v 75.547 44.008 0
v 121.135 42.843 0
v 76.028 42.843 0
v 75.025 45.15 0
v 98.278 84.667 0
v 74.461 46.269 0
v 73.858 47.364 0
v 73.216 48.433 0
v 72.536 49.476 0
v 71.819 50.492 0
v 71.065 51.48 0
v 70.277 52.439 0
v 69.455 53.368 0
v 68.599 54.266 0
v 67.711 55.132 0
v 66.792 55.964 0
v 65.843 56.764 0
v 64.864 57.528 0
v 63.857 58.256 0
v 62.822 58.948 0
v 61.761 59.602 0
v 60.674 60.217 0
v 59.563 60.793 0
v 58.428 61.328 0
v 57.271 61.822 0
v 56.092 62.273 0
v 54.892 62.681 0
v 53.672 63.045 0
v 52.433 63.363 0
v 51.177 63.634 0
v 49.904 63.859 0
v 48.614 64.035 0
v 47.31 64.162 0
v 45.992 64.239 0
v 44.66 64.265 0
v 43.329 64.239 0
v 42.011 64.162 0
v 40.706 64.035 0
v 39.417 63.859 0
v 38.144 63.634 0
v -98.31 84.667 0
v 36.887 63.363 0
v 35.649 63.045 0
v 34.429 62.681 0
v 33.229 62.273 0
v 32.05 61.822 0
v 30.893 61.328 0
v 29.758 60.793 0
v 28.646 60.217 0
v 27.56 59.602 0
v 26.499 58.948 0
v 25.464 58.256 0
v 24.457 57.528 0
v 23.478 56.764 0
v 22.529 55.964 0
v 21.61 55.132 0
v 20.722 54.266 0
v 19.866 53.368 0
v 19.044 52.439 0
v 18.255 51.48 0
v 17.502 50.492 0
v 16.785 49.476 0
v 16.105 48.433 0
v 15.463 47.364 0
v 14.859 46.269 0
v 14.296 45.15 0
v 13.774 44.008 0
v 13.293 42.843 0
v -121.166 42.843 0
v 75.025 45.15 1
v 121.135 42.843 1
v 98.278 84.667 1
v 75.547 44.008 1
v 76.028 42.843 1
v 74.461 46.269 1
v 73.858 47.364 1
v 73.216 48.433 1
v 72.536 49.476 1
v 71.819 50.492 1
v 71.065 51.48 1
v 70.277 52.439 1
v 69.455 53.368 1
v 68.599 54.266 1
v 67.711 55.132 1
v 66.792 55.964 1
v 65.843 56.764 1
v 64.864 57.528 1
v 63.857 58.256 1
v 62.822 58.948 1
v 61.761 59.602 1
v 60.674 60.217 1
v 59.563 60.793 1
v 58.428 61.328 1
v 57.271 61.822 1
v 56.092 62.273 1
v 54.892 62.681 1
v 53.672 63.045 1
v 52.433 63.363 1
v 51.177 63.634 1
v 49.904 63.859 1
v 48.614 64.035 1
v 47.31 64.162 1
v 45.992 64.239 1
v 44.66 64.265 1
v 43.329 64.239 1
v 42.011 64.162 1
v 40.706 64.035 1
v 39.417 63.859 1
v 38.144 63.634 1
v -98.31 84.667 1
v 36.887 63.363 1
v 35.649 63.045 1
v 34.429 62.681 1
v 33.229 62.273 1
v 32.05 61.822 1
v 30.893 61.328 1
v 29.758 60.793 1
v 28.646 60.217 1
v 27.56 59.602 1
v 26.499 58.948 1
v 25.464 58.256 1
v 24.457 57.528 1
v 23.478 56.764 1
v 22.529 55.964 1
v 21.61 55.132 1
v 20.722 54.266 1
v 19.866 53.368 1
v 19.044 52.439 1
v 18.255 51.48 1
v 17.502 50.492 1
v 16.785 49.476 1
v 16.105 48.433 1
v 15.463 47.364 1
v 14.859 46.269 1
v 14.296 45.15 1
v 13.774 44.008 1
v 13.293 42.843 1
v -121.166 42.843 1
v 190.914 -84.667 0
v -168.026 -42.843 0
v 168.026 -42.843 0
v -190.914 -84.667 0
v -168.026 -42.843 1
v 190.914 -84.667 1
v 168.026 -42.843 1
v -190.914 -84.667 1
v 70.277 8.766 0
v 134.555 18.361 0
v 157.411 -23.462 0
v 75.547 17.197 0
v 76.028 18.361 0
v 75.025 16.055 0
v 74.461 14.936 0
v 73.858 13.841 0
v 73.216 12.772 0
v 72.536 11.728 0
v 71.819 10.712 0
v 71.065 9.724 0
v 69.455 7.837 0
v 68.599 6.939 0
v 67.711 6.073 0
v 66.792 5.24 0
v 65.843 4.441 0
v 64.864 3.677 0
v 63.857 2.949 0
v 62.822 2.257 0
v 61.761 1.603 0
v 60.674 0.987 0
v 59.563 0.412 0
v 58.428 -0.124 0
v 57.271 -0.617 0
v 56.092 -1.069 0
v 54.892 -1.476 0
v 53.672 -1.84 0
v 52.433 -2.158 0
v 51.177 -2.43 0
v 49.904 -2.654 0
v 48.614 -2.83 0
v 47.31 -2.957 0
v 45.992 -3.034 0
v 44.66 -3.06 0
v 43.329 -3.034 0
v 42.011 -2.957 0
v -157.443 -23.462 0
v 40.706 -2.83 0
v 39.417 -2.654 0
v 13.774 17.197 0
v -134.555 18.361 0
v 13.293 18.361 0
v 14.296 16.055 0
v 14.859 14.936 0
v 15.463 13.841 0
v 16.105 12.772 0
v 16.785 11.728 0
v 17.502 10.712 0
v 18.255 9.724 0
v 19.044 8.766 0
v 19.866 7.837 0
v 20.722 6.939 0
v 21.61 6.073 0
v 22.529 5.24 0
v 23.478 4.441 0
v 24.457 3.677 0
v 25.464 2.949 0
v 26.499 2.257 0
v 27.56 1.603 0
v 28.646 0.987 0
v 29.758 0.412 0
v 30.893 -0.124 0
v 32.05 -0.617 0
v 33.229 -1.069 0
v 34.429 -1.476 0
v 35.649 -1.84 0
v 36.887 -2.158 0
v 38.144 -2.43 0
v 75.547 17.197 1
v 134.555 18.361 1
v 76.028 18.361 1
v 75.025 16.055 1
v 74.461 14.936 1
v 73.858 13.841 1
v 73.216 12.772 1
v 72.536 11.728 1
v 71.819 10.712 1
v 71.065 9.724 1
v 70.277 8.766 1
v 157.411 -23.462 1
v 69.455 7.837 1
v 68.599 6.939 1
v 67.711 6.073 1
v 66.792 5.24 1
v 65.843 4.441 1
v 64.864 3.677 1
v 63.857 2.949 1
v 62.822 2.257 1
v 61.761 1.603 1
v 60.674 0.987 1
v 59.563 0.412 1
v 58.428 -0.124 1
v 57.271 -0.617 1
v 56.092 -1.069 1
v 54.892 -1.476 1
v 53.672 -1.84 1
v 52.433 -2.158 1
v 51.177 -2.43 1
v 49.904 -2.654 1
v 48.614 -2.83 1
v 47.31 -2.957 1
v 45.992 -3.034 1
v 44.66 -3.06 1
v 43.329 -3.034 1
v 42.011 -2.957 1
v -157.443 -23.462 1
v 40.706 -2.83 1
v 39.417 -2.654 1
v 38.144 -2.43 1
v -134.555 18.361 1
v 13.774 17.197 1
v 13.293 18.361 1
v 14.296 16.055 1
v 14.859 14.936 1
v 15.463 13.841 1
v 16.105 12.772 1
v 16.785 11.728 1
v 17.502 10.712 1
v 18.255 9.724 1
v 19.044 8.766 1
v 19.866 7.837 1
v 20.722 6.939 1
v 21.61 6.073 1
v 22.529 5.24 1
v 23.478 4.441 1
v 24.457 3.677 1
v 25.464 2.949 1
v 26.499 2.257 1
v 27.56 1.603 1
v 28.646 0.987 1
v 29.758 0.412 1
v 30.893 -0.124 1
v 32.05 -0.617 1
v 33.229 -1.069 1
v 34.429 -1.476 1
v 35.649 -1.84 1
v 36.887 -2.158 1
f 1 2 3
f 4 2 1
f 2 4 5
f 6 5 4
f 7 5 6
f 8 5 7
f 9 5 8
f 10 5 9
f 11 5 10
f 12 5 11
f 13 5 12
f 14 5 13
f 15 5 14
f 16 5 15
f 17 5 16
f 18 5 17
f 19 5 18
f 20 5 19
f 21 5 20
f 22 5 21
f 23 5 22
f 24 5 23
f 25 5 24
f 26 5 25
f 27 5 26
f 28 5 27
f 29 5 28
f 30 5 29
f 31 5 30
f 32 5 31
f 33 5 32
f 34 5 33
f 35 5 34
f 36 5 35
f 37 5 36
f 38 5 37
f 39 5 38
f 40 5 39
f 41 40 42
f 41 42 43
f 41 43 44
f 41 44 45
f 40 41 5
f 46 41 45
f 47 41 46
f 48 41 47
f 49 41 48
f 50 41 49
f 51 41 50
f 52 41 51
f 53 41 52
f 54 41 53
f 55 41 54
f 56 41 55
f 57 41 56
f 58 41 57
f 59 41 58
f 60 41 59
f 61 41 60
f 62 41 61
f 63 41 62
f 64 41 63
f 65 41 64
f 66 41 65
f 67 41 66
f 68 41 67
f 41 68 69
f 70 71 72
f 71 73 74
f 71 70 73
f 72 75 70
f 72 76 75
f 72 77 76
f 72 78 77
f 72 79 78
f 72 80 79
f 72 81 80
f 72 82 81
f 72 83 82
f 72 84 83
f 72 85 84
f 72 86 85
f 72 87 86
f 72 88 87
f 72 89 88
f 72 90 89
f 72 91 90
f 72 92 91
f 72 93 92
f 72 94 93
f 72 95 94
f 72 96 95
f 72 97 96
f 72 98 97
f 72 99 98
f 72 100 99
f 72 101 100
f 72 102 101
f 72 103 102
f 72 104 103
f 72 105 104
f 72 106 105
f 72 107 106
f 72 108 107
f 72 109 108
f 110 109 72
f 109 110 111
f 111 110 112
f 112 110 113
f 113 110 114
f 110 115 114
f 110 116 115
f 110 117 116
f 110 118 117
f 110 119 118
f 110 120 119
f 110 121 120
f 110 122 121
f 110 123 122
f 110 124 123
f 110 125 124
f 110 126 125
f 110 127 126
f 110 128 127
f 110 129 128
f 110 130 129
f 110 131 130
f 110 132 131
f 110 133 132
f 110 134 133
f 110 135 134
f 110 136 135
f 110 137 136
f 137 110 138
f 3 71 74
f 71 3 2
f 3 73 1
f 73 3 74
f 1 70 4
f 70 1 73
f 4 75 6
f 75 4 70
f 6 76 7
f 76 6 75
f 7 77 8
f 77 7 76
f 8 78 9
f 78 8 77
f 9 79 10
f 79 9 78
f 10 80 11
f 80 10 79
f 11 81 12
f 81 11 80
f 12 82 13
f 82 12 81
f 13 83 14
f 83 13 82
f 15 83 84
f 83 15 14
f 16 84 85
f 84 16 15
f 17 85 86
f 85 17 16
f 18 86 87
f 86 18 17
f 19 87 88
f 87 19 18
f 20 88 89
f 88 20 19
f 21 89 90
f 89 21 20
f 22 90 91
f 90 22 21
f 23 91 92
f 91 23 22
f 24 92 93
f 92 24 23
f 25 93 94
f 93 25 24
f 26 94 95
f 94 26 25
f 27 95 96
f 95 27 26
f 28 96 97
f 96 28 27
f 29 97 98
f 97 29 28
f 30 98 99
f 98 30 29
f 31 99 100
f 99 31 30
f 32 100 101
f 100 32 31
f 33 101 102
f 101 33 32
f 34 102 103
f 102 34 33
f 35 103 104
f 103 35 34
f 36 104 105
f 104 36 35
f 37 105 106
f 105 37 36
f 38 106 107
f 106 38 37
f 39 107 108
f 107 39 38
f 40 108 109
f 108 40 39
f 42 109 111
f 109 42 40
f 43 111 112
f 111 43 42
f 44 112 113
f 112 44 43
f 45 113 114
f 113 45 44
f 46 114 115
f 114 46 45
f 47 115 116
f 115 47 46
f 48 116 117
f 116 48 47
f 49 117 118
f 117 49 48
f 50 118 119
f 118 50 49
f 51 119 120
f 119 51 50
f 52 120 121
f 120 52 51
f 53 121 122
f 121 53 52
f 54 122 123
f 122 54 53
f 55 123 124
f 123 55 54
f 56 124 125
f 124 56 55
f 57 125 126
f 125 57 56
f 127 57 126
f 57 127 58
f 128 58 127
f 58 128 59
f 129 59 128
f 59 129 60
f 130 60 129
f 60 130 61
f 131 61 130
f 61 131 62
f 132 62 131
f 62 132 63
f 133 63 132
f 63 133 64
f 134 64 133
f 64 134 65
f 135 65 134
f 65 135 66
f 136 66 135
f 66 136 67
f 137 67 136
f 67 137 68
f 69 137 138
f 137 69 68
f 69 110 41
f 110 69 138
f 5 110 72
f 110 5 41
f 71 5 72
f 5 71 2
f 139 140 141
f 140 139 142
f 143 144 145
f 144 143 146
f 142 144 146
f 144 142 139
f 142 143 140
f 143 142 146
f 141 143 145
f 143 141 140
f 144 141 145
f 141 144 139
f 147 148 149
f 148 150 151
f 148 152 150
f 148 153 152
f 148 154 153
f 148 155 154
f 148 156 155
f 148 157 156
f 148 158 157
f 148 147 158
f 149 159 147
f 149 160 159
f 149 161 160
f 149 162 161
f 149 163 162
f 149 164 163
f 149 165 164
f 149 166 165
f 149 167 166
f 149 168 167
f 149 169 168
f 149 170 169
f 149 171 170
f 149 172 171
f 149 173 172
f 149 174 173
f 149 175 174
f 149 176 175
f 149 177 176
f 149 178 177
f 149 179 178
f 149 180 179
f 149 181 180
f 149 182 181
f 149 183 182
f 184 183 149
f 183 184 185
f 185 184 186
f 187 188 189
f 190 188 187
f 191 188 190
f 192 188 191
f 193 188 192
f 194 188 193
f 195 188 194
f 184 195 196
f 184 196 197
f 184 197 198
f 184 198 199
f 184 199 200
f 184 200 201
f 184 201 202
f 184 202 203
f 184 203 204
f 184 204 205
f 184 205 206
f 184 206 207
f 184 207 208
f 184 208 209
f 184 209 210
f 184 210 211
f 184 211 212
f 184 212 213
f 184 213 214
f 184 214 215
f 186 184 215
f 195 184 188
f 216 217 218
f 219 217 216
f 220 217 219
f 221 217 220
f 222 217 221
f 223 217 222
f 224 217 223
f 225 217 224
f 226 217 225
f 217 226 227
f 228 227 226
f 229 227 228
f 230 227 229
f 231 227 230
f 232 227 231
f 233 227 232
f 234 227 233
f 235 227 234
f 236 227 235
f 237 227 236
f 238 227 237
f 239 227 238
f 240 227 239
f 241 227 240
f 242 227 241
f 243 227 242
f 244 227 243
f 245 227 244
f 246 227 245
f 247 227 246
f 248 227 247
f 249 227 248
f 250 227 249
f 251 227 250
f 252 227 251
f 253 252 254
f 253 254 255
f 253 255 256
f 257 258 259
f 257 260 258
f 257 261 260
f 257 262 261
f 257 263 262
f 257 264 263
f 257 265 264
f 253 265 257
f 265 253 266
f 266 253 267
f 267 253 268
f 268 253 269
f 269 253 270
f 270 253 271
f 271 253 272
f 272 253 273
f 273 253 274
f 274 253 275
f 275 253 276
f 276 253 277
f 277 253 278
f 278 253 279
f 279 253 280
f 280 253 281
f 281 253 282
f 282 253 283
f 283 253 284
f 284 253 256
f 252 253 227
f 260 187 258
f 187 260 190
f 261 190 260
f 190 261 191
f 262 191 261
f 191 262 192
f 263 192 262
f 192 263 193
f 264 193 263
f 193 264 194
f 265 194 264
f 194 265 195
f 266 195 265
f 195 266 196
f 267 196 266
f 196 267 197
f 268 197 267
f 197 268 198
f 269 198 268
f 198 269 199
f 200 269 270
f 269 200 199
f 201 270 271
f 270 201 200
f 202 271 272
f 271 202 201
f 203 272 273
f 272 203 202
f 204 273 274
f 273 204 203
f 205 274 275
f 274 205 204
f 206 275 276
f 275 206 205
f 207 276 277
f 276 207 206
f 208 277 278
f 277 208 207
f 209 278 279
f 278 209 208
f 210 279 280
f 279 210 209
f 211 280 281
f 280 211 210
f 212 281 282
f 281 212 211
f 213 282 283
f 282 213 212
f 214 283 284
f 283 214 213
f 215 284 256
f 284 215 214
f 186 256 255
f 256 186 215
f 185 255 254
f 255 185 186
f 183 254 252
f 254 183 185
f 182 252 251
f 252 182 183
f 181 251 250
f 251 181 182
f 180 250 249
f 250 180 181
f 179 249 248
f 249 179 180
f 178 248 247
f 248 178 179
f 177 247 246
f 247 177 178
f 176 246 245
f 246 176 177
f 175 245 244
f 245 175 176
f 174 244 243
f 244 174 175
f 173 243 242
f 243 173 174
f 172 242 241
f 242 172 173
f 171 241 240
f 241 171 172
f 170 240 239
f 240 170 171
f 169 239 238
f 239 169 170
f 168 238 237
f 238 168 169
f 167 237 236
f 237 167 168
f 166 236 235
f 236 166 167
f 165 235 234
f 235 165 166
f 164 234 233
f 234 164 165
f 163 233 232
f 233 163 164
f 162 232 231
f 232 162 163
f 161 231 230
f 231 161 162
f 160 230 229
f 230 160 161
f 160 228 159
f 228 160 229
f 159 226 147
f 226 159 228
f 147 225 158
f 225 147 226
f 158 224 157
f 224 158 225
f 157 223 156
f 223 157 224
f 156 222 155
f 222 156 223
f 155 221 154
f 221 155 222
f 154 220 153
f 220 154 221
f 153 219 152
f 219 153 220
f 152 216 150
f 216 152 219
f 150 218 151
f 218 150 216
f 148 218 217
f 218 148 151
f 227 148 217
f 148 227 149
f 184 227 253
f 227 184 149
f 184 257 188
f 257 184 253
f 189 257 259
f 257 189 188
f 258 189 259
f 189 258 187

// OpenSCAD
// Module names are of the form poly_<inkscape-path-id>().  As a result,
// you can associate a polygon in this OpenSCAD program with the corresponding
// SVG element in the Inkscape document by looking for the XML element with
// the attribute id="inkscape-path-id".

// fudge value is used to ensure that subtracted solids are a tad taller
// in the z dimension than the polygon being subtracted from.  This helps
// keep the resulting .stl file manifold.
fudge = 0.1;

module logo_ia(h) {
	l_ia_poly_path2258(1);
	l_ia_poly_rect2221(1);
	l_ia_poly_path2256(1);
}

module l_ia_poly_path2258(h)
{
  scale([25.4/90, -25.4/90, 1]) union()
  {
    linear_extrude(height=h)
      polygon([[-348.343370,-299.999997],[-429.329816,-151.807228],[47.100903,-151.807228],[48.804186,-155.933918],[50.655575,-159.981314],[52.651679,-163.946025],[54.789107,-167.824659],[57.064467,-171.613824],[59.474369,-175.310131],[62.015420,-178.910187],[64.684229,-182.410601],[67.477406,-185.807982],[70.391557,-189.098939],[73.423293,-192.280080],[76.569221,-195.348015],[79.825951,-198.299352],[83.190090,-201.130700],[86.658248,-203.838668],[90.227032,-206.419864],[93.893053,-208.870898],[97.652917,-211.188377],[101.503235,-213.368912],[105.440613,-215.409109],[109.461662,-217.305580],[113.562990,-219.054931],[117.741204,-220.653773],[121.992915,-222.098713],[126.314730,-223.386361],[130.703258,-224.513324],[135.155107,-225.476213],[139.666887,-226.271636],[144.235206,-226.896202],[148.856672,-227.346518],[153.527894,-227.619195],[158.245481,-227.710841],[162.963070,-227.619199],[167.634295,-227.346524],[172.255764,-226.896210],[176.824084,-226.271647],[181.335866,-225.476225],[185.787717,-224.513338],[190.176246,-223.386375],[194.498061,-222.098728],[198.749772,-220.653788],[202.927987,-219.054947],[207.029315,-217.305596],[211.050363,-215.409125],[214.987742,-213.368927],[218.838059,-211.188392],[222.597923,-208.870912],[226.263942,-206.419878],[229.832726,-203.838681],[233.300883,-201.130712],[236.665021,-198.299363],[239.921749,-195.348025],[243.067677,-192.280089],[246.099411,-189.098946],[249.013562,-185.807988],[251.806737,-182.410606],[254.475545,-178.910191],[257.016595,-175.310134],[259.426496,-171.613827],[261.701856,-167.824660],[263.839283,-163.946026],[265.835387,-159.981315],[267.686776,-155.933918],[269.390058,-151.807228],[429.216864,-151.807228],[348.230419,-299.999997],[-348.343370,-299.999997]]);
  }
}

module l_ia_poly_rect2221(h)
{
  scale([25.4/90, -25.4/90, 1]) union()
  {
    linear_extrude(height=h)
      polygon([[-595.368971,151.807228],[-676.468368,299.999997],[676.468368,299.999997],[595.368971,151.807228],[-595.368971,151.807228]]);
  }
}

module l_ia_poly_path2256(h)
{
  scale([25.4/90, -25.4/90, 1]) union()
  {
    linear_extrude(height=h)
      polygon([[-476.769574,-65.060240],[-557.868971,83.132529],[557.756019,83.132529],[476.769574,-65.060240],[269.390058,-65.060240],[267.686772,-60.933553],[265.835381,-56.886160],[263.839274,-52.921451],[261.701844,-49.042820],[259.426482,-45.253656],[257.016579,-41.557351],[254.475527,-37.957296],[251.806716,-34.456883],[249.013540,-31.059502],[246.099388,-27.768545],[243.067652,-24.587404],[239.921724,-21.519469],[236.664995,-18.568131],[233.300856,-15.736783],[229.832699,-13.028814],[226.263915,-10.447617],[222.597896,-7.996583],[218.838032,-5.679103],[214.987716,-3.498567],[211.050338,-1.458368],[207.029290,0.438103],[202.927964,2.187456],[198.749750,3.786299],[194.498041,5.231240],[190.176227,6.518888],[185.787700,7.645853],[181.335851,8.608743],[176.824072,9.404167],[172.255754,10.028733],[167.634289,10.479050],[162.963067,10.751727],[158.245481,10.843373],[153.527897,10.751724],[148.856678,10.479044],[144.235214,10.028724],[139.666898,9.404156],[135.155119,8.608731],[130.703271,7.645840],[126.314744,6.518874],[121.992930,5.231225],[117.741220,3.786283],[113.563006,2.187440],[109.461678,0.438087],[105.440629,-1.458384],[101.503250,-3.498583],[97.652932,-5.679118],[93.893067,-7.996597],[90.227046,-10.447631],[86.658260,-13.028827],[83.190102,-15.736794],[79.825961,-18.568142],[76.569231,-21.519478],[73.423301,-24.587412],[70.391565,-27.768553],[67.477412,-31.059508],[64.684235,-34.456888],[62.015424,-37.957300],[59.474372,-41.557354],[57.064470,-45.253658],[54.789108,-49.042821],[52.651680,-52.921452],[50.655575,-56.886160],[48.804186,-60.933553],[47.100903,-65.060240],[-476.769574,-65.060240]]);
  }
}

logo_ia(1);
